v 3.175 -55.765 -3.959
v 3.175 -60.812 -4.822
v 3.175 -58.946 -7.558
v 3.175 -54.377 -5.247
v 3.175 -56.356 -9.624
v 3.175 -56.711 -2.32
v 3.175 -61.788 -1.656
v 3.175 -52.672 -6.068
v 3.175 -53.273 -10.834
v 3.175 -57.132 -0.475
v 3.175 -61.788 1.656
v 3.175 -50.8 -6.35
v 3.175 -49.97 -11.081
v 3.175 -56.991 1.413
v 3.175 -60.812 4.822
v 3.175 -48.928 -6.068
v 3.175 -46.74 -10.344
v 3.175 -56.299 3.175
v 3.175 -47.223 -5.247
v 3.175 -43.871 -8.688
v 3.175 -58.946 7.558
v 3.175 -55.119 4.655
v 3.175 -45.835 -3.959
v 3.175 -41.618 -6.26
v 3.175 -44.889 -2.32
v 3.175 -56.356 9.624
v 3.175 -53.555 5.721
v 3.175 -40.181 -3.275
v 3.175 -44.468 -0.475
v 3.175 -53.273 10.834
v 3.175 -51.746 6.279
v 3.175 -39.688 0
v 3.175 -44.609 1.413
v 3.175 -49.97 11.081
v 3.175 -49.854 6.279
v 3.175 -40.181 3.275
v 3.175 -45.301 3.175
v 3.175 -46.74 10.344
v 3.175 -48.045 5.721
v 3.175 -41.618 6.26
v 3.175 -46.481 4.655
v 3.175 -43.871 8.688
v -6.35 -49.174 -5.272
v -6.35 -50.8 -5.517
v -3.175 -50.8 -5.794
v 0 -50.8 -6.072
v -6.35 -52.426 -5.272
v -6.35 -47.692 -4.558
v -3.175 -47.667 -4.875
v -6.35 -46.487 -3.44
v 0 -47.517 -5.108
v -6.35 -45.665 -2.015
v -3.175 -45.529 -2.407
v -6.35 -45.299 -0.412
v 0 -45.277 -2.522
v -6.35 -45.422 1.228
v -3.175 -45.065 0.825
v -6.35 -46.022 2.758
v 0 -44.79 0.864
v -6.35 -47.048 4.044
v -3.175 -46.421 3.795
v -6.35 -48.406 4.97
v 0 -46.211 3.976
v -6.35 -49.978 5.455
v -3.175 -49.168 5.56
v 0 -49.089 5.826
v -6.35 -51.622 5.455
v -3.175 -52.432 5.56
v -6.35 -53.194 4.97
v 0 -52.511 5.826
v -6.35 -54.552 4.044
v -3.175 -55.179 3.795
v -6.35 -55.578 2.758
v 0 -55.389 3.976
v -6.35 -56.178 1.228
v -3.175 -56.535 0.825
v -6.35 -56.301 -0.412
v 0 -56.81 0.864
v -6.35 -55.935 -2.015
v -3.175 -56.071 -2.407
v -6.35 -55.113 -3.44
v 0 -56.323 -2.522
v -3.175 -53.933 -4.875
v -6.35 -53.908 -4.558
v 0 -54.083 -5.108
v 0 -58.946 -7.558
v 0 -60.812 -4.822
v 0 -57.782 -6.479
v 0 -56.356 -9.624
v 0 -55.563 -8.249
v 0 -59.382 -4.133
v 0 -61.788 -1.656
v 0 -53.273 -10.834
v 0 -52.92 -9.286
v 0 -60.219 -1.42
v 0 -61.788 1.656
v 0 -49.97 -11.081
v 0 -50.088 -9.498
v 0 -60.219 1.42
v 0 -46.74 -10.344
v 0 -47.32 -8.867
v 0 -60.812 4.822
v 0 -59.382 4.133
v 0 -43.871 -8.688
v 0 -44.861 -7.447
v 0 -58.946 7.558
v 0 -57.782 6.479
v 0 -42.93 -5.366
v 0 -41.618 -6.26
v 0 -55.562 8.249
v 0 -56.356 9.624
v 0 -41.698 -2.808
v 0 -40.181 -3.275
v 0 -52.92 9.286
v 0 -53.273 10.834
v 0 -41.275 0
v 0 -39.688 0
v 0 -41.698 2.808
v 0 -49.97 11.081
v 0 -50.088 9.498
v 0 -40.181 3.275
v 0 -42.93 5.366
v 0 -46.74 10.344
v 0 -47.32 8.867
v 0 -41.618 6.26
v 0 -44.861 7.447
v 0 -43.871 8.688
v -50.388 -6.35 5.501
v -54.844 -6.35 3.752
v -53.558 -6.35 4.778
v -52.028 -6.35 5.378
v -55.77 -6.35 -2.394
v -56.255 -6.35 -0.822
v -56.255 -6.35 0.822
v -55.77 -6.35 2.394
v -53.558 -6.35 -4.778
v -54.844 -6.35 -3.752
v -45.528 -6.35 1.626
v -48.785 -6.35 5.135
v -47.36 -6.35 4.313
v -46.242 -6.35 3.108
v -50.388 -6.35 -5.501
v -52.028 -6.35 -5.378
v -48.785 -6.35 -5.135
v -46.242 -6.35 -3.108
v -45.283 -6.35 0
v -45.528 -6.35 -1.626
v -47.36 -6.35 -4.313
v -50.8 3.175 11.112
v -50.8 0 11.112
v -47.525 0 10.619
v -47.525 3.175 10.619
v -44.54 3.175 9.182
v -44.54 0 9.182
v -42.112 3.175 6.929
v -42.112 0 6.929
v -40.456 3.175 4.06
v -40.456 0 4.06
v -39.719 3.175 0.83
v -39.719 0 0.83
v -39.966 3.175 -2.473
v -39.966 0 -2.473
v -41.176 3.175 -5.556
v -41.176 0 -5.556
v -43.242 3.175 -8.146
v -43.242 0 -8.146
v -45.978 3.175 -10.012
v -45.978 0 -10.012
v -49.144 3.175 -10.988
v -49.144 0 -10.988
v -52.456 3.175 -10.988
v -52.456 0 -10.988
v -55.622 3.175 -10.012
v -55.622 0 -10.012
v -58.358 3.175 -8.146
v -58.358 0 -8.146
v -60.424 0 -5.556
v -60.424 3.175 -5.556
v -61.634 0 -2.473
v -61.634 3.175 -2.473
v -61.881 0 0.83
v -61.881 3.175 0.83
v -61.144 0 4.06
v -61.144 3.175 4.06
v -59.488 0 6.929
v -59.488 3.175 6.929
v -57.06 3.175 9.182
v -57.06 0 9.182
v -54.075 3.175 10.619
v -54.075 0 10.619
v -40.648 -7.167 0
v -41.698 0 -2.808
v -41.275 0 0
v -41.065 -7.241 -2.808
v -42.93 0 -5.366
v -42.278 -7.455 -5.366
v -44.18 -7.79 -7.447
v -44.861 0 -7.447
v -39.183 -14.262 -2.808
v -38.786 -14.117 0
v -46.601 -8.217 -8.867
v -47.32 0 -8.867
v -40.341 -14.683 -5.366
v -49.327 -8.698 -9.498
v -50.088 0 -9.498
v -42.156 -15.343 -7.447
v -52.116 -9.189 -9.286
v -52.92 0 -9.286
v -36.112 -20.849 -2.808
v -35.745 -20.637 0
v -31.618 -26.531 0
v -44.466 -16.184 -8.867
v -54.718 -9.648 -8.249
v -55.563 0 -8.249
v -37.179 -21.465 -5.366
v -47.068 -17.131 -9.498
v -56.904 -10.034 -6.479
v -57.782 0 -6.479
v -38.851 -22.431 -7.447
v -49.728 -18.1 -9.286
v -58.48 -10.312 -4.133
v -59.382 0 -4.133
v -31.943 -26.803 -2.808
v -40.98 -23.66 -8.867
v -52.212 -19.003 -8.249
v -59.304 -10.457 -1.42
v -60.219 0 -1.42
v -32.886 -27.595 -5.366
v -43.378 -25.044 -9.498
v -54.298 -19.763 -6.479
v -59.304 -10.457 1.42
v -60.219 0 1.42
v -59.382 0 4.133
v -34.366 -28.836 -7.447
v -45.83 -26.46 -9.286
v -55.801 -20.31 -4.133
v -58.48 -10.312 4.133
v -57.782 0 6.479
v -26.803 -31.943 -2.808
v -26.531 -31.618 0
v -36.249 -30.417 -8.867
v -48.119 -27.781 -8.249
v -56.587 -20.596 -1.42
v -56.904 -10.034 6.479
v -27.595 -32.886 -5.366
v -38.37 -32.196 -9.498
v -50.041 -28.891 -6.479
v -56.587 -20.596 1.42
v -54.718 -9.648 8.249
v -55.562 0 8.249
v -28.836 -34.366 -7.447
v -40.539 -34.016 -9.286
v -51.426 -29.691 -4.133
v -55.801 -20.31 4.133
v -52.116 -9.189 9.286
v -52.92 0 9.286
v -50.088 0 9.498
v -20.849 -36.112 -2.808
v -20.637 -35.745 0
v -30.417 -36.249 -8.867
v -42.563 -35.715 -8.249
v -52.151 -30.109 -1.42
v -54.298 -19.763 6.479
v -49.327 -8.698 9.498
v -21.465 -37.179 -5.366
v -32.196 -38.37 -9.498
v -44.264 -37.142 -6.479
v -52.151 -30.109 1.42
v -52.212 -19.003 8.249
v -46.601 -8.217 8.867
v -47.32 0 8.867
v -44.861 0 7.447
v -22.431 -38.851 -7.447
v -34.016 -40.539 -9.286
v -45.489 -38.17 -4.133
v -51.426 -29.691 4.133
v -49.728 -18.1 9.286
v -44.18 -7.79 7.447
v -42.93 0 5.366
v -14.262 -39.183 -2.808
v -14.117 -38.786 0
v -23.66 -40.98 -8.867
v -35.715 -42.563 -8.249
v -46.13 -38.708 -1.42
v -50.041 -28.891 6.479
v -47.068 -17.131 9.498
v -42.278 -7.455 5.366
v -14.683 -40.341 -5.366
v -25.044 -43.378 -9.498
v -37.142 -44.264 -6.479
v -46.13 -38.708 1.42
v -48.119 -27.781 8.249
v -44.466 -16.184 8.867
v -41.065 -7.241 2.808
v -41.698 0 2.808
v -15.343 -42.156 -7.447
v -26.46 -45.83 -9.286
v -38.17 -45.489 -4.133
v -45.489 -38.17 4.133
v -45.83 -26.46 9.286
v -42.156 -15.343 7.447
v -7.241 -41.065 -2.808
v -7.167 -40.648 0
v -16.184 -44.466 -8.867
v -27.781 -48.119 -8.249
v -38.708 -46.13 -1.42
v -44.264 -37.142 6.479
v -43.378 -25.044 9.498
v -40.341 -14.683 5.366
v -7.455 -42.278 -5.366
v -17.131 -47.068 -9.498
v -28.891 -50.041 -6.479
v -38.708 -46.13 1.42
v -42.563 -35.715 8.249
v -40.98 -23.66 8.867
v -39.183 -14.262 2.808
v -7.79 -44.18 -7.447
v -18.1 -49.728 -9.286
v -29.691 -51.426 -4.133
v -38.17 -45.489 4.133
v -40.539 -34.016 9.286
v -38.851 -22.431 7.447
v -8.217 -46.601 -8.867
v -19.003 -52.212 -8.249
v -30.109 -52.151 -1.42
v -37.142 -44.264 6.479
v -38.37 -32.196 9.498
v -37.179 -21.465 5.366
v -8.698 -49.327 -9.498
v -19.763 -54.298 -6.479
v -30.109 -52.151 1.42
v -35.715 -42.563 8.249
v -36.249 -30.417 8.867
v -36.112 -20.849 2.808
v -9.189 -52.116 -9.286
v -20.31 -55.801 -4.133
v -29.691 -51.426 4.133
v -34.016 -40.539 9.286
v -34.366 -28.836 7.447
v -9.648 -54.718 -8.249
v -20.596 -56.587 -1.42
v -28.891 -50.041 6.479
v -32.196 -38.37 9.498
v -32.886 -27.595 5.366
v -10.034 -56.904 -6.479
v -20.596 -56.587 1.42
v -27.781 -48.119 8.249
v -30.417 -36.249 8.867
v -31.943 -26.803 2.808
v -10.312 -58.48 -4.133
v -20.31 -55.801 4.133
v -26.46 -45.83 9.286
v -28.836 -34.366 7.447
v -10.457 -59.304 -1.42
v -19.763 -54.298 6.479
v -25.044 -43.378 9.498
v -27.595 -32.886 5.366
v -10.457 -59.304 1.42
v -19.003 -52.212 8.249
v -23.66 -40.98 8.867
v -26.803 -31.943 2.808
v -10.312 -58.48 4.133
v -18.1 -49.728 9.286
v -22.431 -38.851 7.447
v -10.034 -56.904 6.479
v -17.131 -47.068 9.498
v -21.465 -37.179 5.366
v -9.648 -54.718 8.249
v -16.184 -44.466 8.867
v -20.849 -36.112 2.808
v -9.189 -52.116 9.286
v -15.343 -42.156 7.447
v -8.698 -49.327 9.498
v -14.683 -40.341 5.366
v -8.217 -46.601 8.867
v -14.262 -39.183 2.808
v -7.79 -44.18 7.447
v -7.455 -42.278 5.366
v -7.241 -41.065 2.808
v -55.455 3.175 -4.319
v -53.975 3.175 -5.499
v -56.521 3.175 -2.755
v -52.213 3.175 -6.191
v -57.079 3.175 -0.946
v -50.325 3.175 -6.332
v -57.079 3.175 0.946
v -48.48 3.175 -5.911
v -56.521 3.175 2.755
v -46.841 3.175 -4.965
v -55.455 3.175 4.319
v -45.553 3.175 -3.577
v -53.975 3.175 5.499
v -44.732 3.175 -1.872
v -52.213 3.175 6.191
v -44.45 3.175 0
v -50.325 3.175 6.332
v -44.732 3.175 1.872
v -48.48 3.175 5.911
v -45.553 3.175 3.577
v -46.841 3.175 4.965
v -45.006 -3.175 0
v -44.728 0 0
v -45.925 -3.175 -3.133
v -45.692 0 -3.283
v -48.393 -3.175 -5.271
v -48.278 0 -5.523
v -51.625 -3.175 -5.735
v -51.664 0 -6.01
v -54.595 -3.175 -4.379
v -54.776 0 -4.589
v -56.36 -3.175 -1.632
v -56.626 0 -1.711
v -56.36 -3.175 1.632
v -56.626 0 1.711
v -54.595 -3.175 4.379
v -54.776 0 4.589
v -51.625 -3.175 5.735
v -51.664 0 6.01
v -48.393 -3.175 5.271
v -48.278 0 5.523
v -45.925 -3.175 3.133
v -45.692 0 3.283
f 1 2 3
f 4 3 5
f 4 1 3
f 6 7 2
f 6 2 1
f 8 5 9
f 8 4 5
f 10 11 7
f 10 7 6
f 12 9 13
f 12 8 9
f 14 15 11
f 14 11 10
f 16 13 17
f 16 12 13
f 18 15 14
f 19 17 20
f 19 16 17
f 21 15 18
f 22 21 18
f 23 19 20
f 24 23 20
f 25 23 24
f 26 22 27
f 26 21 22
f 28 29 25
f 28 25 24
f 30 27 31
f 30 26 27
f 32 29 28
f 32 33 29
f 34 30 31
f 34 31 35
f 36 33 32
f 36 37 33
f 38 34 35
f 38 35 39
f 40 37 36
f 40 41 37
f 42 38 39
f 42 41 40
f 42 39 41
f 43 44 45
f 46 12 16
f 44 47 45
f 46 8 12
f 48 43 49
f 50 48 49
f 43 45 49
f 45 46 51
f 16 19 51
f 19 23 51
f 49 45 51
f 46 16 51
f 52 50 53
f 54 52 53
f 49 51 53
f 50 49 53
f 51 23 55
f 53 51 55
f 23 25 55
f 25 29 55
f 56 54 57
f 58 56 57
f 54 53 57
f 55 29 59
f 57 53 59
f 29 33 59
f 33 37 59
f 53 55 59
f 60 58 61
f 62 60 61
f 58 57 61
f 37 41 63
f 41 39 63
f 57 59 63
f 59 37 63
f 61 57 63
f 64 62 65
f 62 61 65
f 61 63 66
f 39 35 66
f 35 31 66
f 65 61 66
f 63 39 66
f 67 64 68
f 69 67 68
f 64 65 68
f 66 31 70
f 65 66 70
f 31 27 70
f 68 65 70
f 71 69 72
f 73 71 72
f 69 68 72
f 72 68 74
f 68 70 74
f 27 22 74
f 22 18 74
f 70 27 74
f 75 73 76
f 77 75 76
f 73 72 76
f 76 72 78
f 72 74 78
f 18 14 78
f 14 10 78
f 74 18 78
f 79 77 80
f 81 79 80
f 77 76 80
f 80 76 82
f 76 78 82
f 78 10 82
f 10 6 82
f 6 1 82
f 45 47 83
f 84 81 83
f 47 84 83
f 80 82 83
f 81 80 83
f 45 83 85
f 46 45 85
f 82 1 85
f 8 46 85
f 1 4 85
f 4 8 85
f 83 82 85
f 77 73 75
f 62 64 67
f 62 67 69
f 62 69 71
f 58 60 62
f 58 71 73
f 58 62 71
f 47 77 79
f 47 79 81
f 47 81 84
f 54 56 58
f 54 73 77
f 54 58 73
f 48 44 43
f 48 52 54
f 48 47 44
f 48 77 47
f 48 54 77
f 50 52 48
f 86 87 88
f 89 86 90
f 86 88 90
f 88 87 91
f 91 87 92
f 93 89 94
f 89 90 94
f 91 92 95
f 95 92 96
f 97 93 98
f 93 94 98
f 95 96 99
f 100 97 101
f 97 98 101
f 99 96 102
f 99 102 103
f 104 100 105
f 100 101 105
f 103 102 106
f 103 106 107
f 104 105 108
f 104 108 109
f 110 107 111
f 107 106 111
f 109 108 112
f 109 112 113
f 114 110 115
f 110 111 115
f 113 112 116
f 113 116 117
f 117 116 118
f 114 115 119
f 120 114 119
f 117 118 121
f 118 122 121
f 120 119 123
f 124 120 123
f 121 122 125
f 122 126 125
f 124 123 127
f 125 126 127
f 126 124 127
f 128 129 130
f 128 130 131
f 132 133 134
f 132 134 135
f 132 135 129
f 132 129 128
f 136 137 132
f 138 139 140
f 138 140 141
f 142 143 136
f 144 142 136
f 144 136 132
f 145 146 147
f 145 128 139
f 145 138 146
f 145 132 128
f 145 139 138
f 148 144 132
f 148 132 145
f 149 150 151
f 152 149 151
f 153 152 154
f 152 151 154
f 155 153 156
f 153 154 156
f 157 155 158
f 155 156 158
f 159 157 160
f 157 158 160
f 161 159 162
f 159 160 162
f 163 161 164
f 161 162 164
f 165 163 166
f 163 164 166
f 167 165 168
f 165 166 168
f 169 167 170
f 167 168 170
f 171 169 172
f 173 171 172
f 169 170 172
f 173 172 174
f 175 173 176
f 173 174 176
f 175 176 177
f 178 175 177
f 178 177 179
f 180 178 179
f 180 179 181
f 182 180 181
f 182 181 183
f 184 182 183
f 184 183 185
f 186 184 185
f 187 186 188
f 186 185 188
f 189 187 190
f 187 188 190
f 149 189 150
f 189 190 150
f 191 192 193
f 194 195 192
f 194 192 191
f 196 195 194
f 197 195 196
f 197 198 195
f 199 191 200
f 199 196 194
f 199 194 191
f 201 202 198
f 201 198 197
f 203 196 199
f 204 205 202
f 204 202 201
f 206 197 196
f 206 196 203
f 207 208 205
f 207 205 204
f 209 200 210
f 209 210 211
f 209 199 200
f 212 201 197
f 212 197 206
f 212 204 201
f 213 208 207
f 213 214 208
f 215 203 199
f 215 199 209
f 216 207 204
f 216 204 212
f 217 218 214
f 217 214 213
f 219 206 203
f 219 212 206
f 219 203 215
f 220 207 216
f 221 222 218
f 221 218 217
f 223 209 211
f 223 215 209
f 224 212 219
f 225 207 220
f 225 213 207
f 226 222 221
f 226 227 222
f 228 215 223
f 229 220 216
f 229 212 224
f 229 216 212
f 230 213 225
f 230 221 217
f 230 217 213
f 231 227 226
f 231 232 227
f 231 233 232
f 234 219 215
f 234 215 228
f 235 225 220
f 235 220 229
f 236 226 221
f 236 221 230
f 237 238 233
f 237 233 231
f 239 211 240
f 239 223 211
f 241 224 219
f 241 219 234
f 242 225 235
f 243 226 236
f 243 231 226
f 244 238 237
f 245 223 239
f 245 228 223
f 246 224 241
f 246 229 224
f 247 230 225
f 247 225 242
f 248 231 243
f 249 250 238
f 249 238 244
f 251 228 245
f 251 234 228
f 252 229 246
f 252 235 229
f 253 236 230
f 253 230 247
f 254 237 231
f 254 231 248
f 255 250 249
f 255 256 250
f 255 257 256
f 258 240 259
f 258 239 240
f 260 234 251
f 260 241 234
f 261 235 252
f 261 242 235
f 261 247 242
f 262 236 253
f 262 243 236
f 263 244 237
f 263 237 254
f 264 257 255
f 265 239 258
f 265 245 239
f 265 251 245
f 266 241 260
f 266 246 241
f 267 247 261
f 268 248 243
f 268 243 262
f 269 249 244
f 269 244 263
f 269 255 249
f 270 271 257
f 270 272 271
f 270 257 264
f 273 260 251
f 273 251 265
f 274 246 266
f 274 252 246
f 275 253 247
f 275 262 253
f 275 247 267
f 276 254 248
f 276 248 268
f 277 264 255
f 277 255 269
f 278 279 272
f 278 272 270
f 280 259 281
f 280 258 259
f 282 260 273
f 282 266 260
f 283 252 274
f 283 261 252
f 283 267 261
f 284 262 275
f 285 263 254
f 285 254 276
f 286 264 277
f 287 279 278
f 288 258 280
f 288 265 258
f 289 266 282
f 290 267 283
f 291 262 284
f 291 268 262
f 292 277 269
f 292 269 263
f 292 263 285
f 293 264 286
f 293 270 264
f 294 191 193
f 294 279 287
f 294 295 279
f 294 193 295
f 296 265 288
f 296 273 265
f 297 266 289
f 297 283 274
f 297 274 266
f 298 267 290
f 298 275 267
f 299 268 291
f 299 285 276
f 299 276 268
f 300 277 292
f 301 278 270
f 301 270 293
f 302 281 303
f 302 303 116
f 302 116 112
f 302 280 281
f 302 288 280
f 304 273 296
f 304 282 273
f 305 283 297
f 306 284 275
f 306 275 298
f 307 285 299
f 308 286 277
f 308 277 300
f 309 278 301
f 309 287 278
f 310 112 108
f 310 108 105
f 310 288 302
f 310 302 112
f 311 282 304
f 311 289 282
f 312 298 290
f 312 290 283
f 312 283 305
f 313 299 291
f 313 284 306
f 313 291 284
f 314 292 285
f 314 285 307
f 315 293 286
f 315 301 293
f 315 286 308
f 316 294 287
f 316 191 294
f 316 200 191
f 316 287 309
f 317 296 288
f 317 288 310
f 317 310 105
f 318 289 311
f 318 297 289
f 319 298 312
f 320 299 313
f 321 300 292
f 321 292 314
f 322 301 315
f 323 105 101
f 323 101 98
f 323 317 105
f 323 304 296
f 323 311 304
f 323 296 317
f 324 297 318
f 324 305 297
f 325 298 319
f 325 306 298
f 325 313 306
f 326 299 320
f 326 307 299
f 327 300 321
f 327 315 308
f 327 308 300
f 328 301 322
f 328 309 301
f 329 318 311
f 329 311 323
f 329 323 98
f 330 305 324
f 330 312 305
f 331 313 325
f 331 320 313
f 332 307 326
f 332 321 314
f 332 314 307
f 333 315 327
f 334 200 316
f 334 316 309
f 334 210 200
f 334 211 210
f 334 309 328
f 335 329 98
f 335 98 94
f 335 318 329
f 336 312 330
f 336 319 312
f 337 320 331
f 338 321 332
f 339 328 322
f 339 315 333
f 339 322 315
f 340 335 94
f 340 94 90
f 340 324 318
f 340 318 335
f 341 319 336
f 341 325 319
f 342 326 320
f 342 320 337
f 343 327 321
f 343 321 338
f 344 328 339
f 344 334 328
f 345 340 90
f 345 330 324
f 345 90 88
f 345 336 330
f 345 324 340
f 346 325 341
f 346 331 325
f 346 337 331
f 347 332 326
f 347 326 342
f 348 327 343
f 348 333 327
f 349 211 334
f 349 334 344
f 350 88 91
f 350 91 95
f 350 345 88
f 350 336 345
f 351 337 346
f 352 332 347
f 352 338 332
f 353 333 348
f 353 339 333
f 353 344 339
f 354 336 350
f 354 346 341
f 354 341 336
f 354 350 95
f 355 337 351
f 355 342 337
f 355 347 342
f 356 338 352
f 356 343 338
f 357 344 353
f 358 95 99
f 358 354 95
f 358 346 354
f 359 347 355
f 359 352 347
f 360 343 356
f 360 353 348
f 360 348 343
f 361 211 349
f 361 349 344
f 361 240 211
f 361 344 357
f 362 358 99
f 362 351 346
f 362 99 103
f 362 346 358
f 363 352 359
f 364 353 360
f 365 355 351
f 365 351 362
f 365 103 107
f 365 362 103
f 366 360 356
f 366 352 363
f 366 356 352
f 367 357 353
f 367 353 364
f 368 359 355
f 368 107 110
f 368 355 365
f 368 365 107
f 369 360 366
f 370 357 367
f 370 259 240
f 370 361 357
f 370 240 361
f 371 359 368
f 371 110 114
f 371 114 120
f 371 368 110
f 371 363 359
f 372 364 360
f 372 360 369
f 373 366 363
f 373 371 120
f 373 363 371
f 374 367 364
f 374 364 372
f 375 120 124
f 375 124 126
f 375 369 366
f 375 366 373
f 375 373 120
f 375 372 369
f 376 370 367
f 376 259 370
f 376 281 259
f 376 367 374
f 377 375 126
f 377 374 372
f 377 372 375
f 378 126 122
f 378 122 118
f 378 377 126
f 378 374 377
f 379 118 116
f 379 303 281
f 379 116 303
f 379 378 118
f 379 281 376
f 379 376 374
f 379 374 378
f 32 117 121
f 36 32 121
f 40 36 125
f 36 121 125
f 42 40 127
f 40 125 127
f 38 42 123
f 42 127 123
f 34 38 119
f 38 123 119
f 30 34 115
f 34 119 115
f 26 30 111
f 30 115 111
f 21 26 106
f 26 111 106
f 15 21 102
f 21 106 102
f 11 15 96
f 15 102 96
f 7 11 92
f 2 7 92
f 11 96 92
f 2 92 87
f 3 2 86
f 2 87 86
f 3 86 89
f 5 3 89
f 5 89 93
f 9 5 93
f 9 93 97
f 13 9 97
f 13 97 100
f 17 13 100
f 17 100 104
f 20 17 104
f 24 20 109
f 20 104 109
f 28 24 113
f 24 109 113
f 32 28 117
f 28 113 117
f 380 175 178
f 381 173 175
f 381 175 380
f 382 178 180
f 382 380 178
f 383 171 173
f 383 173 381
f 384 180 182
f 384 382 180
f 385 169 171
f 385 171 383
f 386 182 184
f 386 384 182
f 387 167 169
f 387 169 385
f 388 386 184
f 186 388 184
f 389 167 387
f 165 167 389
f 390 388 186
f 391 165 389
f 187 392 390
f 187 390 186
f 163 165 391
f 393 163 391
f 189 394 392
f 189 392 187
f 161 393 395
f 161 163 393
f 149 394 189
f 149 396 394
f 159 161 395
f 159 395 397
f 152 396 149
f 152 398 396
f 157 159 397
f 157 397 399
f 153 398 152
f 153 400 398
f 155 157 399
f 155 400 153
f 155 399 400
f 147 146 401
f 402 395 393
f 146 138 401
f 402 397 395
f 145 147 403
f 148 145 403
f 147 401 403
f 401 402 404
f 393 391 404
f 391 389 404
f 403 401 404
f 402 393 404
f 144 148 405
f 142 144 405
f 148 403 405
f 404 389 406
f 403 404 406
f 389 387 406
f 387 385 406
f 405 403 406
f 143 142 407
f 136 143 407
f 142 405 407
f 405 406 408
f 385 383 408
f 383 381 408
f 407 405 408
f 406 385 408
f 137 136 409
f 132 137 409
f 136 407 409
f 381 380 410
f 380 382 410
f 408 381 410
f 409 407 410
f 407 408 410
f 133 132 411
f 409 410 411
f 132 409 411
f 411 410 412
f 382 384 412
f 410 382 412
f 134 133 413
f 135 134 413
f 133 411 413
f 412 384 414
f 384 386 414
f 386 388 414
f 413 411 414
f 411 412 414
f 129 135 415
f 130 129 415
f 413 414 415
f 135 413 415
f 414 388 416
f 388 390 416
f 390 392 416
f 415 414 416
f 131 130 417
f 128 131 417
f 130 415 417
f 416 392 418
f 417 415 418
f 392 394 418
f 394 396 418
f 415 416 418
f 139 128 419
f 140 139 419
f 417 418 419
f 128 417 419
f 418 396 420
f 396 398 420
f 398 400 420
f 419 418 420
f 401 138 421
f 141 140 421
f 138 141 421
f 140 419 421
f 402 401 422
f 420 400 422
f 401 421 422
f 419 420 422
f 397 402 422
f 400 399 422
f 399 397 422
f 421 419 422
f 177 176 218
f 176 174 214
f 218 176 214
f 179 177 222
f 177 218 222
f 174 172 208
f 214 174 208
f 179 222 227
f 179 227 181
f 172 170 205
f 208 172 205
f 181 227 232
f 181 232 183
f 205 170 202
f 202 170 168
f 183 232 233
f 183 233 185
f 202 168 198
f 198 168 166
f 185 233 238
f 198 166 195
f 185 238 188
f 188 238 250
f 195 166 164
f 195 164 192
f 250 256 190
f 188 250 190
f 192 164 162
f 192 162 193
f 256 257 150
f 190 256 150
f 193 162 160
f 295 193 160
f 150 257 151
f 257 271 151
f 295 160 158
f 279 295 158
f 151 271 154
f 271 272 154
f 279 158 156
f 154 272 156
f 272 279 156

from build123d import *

# Parameters (mm, degrees)
SKETCH2_R           = 9.525
SKETCH3_R           = 11.1125
BOSS_EXTRUDE1_DEPTH = 3.175
SKETCH4_R           = 11.1125
BOSS_EXTRUDE2_DEPTH = 3.175
SKETCH5_R           = 6.35
CUT_EXTRUDE1_DEPTH  = 9.525
CUT_EXTRUDE1_DRAFT  = -5
SKETCH6_R           = 6.35
CUT_EXTRUDE2_DEPTH  = 9.525
CUT_EXTRUDE2_DRAFT  = -5


with BuildPart() as part:
    # Sweep2: sweep along a path in Sketch1
    with BuildLine(Plane.XY) as sweep2_path:
        ThreePointArc((-50.8, 0), (-35.921024484, -35.921024484), (0, -50.8))
    # Sketch2 → Sweep2 (sweep)
    with BuildSketch(Plane(origin=(0, 0, 0), x_dir=(1, 0, 0), z_dir=(0, 1, 0))):
        with Locations((-50.8, 0)):
            Circle(SKETCH2_R)
    sweep(path=sweep2_path.line)

    # Sketch3 → Boss-Extrude1 (add)
    with BuildSketch(Plane(origin=(0, 0, 0), x_dir=(1, 0, 0), z_dir=(0, 1, 0))):
        with Locations(Location((-50.8, 0, 0), (0, 0, 270))):
            Circle(SKETCH3_R)
    extrude(amount=BOSS_EXTRUDE1_DEPTH)

    # Sketch4 → Boss-Extrude2 (add)
    with BuildSketch(Plane(origin=(0, 0, 0), x_dir=(0, 0, -1), z_dir=(1, 0, 0))):
        with Locations(Location((0, -50.8, 0), (0, 0, 90))):
            Circle(SKETCH4_R)
    extrude(amount=BOSS_EXTRUDE2_DEPTH)


with BuildPart() as cut_extrude1_tool:
    # Sketch5 → Cut-Extrude1 (with draft: the straight prism first)
    with BuildSketch(Plane(origin=(0, 3.175, 0), x_dir=(1, 0, 0), z_dir=(0, 1, 0))):
        with Locations((-50.8, 0)):
            Circle(SKETCH5_R)
    extrude(amount=-CUT_EXTRUDE1_DEPTH)
    # Cut-Extrude1: the draft: its side faces are tilted about the plane it starts from
    cut_extrude1_sides = [cut_extrude1_tool.faces().sort_by_distance(p)[0] for p in [
        (-57.15, -1.5875, 0),
    ]]
    draft(cut_extrude1_sides, Plane(origin=(0, 3.175, 0), x_dir=(1, 0, 0), z_dir=(0, 1, 0)), CUT_EXTRUDE1_DRAFT)


with BuildPart() as part_1:
    add(part.part)

    # Cut-Extrude1: cut by cut_extrude1_tool
    add(cut_extrude1_tool.part, mode=Mode.SUBTRACT)


with BuildPart() as cut_extrude2_tool:
    # Sketch6 → Cut-Extrude2 (with draft: the straight prism first)
    with BuildSketch(Plane(origin=(3.175, 0, 0), x_dir=(0, 0, -1), z_dir=(1, 0, 0))):
        with Locations((0, -50.8)):
            Circle(SKETCH6_R)
    extrude(amount=-CUT_EXTRUDE2_DEPTH)
    # Cut-Extrude2: the draft: its side faces are tilted about the plane it starts from
    cut_extrude2_sides = [cut_extrude2_tool.faces().sort_by_distance(p)[0] for p in [
        (-1.5875, -50.8, 6.35),
    ]]
    draft(cut_extrude2_sides, Plane(origin=(3.175, 0, 0), x_dir=(0, 0, -1), z_dir=(1, 0, 0)), CUT_EXTRUDE2_DRAFT)


with BuildPart() as part_2:
    add(part_1.part)

    # Cut-Extrude2: cut by cut_extrude2_tool
    add(cut_extrude2_tool.part, mode=Mode.SUBTRACT)


solid = part_2.part
